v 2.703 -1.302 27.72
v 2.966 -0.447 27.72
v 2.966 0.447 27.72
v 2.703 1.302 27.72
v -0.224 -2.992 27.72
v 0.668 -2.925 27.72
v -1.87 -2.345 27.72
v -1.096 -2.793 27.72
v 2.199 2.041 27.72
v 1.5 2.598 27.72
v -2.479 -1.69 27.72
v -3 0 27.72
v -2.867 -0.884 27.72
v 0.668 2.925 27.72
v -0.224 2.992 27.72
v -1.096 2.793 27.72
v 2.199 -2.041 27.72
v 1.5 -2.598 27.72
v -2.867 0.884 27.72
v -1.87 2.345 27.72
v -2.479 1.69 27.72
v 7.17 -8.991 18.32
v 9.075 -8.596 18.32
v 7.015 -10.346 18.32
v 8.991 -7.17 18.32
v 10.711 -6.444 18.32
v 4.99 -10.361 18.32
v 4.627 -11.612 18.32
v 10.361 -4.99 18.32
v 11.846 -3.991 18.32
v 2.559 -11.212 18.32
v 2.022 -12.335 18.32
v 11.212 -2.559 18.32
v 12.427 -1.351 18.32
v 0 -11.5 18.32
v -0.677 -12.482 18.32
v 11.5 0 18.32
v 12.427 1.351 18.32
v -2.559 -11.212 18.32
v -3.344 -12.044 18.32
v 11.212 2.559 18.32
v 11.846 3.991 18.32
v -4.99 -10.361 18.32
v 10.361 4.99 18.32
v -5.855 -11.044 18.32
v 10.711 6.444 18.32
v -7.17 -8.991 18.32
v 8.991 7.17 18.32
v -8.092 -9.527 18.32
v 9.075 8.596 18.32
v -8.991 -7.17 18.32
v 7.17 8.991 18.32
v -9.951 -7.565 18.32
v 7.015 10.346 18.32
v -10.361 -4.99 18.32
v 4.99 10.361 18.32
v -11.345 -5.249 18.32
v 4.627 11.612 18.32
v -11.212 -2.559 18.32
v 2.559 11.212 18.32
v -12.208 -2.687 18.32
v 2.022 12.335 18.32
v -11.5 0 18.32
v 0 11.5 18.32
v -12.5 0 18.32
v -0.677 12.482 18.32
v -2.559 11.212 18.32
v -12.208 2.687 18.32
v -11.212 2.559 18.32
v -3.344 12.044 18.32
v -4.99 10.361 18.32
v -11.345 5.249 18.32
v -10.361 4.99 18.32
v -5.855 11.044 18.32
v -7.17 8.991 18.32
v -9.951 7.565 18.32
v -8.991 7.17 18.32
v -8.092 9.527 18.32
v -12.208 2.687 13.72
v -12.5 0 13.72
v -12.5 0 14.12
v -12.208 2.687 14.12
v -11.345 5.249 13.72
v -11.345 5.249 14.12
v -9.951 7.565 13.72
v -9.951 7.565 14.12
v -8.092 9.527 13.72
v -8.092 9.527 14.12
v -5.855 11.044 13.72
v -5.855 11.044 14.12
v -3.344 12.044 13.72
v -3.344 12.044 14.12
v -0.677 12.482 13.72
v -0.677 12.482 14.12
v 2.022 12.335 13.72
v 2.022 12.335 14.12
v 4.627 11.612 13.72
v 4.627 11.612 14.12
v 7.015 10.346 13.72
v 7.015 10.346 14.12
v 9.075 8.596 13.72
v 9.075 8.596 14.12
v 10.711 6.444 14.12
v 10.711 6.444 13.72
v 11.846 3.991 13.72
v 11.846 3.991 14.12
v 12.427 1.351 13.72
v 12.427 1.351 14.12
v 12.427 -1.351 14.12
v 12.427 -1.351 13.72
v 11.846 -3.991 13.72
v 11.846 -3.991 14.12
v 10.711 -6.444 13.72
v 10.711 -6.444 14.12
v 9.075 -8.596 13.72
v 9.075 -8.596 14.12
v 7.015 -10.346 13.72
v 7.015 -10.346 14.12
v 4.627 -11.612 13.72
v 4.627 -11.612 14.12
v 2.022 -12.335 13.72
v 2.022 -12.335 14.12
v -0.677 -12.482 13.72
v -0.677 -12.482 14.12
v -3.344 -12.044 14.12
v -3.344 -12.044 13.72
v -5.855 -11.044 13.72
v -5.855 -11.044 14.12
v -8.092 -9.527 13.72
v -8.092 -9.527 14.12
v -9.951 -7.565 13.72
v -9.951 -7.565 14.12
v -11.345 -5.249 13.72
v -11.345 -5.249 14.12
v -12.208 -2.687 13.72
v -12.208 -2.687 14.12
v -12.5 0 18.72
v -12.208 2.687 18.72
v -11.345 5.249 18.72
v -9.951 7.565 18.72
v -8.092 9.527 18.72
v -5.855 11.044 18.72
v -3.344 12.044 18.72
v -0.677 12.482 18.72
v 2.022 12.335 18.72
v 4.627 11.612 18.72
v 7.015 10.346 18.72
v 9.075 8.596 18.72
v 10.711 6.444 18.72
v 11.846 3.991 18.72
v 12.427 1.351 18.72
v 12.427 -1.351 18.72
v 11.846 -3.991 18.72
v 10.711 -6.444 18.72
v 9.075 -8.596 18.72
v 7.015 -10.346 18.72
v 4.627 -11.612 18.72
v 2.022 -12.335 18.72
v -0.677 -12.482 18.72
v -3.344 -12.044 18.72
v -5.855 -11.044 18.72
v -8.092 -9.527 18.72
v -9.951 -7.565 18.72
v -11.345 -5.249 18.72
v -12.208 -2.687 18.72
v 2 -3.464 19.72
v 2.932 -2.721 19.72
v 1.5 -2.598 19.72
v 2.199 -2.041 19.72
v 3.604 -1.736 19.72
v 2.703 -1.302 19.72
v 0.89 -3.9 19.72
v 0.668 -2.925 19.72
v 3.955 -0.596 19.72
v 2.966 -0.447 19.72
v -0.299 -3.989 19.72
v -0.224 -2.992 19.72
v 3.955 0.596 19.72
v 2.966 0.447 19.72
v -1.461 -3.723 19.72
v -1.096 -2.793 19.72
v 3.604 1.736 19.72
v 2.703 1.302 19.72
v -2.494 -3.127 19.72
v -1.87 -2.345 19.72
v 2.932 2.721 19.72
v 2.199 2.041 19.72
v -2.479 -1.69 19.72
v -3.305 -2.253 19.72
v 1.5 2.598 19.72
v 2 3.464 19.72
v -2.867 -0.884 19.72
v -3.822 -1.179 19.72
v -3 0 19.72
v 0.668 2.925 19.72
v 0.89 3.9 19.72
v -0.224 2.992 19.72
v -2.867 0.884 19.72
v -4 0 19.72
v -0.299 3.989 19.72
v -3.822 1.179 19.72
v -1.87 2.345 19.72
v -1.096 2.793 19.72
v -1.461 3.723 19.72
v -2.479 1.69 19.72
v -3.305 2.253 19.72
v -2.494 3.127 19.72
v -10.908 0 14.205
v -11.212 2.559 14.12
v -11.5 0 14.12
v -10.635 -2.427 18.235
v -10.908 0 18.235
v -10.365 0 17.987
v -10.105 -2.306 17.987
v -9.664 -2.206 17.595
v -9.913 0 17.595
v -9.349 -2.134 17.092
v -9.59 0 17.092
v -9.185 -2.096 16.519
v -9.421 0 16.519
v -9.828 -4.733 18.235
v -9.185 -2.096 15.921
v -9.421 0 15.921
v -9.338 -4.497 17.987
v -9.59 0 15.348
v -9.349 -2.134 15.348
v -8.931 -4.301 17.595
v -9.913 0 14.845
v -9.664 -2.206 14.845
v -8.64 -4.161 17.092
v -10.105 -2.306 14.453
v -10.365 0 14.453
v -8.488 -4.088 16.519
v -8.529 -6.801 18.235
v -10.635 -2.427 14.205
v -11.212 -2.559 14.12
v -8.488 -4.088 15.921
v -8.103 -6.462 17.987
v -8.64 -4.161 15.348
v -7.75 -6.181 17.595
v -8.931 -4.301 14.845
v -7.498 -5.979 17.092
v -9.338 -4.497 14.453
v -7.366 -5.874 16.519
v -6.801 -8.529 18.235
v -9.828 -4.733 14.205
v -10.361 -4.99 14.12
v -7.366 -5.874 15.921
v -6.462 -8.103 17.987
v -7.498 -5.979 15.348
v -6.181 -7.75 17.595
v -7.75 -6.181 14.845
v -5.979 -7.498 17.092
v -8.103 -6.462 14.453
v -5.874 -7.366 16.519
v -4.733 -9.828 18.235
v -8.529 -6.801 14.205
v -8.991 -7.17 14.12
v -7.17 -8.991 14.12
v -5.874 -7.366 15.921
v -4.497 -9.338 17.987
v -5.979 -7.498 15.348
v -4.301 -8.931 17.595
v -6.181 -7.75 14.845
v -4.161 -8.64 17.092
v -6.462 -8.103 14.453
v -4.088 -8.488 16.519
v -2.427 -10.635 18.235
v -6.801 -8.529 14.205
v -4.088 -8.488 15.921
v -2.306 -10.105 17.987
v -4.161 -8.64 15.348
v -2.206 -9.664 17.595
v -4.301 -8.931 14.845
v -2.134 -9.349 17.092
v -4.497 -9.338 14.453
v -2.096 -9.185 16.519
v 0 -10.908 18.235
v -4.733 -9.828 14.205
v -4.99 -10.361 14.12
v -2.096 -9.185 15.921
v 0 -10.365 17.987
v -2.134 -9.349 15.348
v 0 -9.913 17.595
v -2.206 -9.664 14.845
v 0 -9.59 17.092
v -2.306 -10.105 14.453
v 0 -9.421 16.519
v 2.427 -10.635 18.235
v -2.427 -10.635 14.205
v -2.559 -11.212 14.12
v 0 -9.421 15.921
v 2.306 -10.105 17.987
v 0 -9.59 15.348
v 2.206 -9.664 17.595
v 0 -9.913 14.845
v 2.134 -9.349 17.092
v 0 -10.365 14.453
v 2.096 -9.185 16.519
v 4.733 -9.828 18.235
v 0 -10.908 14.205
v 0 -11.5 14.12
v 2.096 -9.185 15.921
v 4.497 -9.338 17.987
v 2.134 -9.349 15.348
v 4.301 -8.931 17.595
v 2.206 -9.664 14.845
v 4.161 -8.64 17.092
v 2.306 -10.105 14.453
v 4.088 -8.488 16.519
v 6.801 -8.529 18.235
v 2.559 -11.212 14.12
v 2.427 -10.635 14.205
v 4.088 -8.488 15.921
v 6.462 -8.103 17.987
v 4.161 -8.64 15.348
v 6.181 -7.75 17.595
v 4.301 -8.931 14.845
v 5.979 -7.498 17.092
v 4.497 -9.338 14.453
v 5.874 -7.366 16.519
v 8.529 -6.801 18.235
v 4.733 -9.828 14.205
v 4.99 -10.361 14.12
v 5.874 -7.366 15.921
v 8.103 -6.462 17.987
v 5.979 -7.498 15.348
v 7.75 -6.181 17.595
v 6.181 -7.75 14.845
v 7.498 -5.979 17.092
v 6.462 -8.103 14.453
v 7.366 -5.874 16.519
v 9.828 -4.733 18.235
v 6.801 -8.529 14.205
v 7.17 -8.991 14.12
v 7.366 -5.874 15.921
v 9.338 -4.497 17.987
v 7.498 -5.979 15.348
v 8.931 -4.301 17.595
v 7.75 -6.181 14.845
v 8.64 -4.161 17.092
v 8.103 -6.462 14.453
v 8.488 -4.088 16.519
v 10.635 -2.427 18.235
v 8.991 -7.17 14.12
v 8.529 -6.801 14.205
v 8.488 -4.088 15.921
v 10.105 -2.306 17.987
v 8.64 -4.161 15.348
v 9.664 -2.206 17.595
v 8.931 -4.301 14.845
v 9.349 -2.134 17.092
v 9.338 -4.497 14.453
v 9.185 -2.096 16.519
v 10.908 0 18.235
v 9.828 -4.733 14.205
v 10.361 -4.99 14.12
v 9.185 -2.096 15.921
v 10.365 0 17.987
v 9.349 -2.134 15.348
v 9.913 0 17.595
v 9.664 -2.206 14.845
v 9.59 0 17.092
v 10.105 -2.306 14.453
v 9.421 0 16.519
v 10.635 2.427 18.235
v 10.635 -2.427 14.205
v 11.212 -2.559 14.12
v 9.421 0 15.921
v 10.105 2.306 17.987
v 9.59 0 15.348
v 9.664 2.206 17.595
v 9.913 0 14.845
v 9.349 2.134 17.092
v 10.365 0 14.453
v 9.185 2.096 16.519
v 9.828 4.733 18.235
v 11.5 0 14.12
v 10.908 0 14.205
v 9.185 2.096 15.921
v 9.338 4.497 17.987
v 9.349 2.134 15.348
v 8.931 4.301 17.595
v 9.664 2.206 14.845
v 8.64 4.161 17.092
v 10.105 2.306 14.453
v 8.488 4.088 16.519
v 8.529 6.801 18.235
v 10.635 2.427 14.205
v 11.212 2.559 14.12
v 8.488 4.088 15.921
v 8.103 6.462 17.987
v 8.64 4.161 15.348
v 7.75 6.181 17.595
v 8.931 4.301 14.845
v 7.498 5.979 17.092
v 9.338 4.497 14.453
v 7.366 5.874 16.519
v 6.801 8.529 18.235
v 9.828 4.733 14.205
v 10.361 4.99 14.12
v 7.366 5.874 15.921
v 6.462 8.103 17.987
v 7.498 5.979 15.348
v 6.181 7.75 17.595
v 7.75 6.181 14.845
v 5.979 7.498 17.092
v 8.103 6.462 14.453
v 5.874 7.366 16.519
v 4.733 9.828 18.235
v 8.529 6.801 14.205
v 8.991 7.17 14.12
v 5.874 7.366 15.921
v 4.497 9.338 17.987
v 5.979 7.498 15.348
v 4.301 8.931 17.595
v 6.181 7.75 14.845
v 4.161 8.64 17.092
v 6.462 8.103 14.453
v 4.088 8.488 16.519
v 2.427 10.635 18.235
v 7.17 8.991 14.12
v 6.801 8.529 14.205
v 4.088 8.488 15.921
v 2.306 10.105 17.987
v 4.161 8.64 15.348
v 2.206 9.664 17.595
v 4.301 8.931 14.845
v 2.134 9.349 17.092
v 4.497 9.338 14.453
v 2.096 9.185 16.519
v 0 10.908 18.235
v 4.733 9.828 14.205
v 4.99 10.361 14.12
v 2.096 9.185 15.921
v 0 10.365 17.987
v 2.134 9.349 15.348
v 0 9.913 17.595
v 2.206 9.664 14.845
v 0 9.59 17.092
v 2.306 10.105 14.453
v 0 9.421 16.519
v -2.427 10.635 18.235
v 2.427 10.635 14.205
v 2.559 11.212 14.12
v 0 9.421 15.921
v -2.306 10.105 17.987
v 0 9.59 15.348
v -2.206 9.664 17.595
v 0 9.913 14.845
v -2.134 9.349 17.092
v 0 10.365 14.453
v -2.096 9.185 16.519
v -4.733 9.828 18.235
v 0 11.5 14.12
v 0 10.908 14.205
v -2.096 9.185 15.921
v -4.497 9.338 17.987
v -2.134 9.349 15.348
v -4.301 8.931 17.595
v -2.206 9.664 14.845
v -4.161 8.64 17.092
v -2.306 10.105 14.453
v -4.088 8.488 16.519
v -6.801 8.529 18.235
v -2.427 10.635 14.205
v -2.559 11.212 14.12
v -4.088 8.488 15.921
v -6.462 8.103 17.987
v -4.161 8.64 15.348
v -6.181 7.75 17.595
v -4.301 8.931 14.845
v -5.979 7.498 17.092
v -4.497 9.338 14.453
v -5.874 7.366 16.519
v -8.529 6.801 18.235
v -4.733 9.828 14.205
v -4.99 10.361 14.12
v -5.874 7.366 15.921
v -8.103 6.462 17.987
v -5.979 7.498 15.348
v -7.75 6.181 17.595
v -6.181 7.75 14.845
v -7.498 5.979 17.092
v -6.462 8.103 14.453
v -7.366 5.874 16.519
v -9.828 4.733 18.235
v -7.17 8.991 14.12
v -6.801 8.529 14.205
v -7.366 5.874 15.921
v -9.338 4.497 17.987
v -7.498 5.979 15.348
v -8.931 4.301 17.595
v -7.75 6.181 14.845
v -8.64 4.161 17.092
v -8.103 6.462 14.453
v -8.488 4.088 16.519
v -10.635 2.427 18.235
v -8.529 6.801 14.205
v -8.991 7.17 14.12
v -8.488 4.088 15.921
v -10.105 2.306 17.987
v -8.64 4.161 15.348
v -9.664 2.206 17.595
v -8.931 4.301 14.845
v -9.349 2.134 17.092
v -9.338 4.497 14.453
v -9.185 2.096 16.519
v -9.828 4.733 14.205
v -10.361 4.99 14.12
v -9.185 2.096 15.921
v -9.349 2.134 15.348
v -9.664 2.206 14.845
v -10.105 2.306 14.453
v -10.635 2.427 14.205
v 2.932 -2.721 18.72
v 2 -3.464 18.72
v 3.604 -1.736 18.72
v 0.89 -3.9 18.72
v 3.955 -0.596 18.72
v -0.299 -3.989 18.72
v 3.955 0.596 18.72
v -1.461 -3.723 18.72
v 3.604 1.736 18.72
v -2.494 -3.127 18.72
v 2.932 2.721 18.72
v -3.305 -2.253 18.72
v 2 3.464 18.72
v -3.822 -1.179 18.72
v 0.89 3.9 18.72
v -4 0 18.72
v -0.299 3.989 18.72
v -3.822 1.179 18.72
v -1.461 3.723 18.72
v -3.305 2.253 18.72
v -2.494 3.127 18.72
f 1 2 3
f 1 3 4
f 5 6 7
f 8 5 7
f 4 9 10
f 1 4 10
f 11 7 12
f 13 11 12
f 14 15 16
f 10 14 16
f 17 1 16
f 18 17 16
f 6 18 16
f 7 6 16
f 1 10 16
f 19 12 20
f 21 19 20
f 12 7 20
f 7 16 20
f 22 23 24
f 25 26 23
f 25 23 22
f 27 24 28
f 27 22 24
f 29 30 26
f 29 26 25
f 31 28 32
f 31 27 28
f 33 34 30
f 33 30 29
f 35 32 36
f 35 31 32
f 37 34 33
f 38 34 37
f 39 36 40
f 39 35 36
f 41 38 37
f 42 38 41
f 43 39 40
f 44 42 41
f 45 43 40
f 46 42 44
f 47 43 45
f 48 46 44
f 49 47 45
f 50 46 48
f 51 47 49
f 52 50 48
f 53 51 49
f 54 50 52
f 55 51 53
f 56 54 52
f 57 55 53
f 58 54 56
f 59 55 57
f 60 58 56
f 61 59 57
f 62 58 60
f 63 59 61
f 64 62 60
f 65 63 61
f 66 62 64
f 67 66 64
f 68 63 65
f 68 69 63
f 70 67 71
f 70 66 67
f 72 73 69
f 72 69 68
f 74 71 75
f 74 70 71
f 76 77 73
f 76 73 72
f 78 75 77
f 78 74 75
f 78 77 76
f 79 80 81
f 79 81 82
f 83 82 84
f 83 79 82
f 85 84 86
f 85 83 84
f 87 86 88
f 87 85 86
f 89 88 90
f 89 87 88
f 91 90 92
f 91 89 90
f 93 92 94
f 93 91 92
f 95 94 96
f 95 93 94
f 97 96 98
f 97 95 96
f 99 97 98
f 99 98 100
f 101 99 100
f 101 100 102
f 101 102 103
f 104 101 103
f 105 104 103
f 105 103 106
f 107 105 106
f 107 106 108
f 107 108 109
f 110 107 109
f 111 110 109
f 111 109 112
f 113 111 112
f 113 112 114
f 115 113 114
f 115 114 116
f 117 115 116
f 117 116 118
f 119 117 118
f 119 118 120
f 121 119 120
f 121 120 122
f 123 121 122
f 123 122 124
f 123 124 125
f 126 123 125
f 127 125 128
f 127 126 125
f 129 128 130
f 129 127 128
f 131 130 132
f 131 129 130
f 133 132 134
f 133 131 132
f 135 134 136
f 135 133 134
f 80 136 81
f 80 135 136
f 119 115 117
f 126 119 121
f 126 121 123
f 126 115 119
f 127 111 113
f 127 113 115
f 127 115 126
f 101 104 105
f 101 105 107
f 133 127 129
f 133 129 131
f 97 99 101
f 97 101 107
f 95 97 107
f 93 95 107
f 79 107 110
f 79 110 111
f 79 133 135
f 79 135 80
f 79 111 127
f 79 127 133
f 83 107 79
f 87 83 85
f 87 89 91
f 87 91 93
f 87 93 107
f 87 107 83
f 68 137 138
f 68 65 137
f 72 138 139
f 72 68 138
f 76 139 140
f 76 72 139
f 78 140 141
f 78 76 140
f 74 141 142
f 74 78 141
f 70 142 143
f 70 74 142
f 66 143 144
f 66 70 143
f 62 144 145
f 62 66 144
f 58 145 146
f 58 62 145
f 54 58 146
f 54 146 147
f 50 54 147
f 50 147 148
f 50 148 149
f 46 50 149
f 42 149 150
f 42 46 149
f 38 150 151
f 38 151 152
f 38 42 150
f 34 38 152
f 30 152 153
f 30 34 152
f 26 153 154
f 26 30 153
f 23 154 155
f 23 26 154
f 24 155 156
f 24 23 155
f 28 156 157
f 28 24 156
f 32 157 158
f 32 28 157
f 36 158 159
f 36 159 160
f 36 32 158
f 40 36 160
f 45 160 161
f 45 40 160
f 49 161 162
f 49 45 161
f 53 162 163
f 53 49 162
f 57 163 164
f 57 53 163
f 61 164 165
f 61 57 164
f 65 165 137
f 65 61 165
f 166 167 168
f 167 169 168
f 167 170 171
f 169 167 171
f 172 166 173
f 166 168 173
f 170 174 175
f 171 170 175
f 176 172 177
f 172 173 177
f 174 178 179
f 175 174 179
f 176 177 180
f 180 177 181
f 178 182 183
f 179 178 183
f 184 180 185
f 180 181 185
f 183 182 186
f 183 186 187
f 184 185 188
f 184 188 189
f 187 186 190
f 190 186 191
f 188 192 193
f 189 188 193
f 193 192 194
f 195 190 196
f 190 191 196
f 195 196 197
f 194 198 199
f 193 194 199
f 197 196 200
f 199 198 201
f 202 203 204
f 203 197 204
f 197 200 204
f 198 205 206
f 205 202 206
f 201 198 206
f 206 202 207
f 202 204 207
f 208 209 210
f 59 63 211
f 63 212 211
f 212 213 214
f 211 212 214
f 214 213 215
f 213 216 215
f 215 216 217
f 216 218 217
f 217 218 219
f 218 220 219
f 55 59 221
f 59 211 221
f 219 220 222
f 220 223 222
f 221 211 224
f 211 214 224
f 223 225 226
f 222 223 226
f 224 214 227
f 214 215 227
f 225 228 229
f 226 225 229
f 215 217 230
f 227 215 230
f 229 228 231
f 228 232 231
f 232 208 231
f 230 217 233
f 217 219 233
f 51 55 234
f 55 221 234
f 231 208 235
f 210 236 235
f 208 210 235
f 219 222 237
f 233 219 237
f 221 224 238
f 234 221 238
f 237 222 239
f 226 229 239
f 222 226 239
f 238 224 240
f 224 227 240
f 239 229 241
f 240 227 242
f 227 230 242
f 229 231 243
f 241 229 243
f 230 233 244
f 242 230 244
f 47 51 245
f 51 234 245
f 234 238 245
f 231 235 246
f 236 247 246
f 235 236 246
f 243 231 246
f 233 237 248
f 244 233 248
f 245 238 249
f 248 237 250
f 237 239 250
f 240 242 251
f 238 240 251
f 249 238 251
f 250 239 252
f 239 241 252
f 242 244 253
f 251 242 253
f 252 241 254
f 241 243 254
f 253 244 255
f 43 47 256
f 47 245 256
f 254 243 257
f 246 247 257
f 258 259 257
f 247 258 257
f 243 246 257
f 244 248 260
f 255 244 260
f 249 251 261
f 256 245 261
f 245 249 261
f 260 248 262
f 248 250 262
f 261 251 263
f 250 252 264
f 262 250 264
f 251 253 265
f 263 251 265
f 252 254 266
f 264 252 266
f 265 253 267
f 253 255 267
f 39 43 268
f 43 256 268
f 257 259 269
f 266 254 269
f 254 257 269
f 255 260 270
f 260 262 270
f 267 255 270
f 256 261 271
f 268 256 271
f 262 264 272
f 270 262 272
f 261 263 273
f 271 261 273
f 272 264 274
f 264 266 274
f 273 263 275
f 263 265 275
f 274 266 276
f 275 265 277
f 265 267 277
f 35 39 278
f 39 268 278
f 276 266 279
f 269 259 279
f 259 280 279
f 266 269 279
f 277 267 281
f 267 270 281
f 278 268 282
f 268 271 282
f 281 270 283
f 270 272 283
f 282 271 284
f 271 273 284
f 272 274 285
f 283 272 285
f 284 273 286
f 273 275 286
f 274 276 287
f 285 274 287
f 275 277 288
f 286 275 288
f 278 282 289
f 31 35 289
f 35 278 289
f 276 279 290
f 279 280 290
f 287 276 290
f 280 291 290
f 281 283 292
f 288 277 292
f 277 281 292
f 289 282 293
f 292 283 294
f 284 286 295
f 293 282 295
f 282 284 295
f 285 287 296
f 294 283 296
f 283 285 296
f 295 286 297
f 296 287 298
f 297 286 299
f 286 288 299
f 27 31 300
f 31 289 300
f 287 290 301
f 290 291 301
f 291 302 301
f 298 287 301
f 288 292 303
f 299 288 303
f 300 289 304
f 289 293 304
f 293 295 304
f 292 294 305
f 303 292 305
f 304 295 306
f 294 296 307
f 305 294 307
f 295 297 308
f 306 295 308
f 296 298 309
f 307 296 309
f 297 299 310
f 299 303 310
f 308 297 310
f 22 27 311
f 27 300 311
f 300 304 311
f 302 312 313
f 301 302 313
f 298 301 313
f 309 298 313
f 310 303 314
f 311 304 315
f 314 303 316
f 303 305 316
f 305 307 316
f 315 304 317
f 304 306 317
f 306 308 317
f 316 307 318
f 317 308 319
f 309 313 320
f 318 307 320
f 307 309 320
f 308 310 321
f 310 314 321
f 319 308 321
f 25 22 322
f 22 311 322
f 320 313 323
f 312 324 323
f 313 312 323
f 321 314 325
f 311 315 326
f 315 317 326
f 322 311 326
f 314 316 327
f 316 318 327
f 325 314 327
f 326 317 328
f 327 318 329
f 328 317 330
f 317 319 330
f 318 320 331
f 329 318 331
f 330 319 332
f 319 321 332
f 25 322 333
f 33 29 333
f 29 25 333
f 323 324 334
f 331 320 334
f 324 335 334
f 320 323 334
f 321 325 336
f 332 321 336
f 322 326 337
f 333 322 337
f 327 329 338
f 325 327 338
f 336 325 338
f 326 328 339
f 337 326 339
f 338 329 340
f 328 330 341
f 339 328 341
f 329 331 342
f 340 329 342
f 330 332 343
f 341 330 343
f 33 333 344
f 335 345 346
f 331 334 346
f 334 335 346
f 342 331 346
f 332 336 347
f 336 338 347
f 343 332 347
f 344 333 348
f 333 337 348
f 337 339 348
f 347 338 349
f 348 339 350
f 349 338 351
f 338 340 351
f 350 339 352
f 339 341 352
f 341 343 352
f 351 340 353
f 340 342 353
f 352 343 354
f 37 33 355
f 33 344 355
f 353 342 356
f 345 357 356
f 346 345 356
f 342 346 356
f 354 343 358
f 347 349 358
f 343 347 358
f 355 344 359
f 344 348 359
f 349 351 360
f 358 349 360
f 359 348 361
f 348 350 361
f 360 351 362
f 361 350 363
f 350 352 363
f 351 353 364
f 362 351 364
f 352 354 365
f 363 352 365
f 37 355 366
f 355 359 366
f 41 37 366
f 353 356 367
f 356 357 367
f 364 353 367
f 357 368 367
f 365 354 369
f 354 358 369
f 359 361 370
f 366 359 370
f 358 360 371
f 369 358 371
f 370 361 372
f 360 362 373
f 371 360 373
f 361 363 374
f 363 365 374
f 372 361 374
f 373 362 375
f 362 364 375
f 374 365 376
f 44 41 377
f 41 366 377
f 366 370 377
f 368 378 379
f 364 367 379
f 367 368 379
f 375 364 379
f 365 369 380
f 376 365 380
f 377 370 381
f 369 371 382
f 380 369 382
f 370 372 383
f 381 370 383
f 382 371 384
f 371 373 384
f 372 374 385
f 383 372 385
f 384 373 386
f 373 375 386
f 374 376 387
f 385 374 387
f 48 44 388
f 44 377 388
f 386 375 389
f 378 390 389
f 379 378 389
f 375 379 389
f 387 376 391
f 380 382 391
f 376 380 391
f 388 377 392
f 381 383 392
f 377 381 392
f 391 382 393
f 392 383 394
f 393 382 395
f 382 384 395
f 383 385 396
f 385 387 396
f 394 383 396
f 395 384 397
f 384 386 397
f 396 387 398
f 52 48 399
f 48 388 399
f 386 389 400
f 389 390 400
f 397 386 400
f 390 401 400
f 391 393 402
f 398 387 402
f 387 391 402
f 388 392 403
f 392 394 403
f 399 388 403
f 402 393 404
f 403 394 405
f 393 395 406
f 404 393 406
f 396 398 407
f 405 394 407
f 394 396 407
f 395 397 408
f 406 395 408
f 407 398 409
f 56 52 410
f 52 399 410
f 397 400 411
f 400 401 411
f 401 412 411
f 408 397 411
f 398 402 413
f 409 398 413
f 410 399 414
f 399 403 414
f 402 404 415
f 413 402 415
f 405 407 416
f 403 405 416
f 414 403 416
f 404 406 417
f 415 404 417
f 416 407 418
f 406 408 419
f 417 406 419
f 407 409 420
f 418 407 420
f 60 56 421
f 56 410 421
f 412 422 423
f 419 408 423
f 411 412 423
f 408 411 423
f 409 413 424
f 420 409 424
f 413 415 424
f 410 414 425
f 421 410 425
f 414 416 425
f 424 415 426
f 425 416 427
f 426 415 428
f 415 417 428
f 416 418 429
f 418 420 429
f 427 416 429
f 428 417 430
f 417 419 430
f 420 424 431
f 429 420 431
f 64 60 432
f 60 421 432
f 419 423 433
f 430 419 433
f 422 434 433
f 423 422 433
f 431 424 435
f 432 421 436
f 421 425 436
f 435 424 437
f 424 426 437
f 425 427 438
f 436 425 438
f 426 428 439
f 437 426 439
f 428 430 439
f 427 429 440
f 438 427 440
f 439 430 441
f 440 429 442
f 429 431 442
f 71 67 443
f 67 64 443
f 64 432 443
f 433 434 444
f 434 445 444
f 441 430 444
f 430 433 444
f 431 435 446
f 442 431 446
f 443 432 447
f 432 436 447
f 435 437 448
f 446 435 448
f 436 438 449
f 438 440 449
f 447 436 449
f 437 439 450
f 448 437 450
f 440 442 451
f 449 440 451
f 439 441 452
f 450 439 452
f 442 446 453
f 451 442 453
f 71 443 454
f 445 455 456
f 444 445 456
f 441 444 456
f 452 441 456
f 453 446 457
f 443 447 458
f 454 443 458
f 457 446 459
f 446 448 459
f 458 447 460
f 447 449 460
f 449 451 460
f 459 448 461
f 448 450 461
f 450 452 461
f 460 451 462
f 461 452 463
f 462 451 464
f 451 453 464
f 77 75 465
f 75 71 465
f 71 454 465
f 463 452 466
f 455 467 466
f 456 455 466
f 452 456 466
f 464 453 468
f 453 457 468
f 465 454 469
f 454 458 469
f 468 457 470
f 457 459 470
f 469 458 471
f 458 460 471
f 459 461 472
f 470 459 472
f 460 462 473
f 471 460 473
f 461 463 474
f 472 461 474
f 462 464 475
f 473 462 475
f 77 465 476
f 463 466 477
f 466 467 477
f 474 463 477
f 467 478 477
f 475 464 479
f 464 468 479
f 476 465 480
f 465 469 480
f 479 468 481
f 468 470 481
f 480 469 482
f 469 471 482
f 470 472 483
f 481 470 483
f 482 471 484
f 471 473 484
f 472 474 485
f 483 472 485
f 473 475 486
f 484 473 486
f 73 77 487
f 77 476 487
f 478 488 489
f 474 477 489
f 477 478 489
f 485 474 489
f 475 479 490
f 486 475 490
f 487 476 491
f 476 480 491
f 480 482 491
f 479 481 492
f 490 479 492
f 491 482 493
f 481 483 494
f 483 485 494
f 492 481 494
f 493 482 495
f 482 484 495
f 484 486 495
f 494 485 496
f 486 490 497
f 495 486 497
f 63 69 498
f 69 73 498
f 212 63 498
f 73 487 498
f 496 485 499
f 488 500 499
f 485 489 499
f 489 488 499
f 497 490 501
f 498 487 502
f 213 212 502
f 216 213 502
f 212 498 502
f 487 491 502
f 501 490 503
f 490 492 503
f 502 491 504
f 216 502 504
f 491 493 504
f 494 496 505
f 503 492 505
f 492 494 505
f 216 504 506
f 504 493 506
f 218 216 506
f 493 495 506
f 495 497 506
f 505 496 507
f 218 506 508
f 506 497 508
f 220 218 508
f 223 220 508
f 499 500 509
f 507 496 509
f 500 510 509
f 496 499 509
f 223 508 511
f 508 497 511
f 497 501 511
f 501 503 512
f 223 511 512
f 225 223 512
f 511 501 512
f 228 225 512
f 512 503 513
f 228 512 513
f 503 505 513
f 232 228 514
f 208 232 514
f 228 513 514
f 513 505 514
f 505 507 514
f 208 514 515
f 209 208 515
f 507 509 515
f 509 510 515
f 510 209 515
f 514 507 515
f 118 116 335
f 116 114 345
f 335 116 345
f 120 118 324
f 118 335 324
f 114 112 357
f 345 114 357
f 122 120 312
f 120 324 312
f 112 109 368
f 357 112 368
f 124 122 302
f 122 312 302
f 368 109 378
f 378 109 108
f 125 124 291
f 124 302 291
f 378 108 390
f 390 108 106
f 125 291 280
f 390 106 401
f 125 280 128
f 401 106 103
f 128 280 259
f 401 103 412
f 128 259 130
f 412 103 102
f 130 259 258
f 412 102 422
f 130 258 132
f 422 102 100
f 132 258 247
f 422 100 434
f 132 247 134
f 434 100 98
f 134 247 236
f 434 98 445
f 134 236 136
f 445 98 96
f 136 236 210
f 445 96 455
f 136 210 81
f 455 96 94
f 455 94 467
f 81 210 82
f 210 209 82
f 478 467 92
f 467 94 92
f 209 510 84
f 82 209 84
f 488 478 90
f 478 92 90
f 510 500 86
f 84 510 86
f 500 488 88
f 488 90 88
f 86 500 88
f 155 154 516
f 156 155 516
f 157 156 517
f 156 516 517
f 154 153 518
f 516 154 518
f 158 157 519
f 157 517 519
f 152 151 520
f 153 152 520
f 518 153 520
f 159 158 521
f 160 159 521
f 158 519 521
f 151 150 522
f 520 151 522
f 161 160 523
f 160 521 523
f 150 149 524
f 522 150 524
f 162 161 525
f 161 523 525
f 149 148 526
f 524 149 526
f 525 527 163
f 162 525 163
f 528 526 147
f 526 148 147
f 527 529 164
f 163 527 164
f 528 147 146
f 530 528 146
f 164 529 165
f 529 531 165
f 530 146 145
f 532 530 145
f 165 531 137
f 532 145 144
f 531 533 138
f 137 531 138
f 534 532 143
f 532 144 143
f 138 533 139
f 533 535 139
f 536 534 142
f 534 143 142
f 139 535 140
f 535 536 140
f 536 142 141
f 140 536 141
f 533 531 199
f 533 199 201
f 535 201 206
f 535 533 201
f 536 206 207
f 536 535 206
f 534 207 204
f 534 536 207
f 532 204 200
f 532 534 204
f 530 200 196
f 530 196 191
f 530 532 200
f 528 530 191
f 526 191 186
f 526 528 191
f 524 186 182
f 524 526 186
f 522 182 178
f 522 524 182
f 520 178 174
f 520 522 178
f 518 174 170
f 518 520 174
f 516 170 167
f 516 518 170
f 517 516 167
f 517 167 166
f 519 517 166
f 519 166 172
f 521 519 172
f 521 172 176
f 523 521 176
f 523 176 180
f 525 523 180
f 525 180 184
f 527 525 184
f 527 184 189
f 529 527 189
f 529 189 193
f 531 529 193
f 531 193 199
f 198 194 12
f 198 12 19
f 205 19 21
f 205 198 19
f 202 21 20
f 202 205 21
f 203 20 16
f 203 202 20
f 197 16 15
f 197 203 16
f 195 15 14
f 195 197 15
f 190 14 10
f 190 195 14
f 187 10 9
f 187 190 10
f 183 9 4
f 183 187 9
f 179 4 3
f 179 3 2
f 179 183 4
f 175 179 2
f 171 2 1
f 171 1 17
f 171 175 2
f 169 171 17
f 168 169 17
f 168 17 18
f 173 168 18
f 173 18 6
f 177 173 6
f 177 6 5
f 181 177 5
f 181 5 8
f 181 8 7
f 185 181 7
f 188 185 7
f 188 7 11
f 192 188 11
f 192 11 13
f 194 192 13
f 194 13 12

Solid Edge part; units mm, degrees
sketch "Sketch1" plane through (0, 0, 0) normal (0, -1, 0) x (1, 0, 0)
  line L0 (0, 18.72) -> (0, 13.72)
  line L1 (0, 13.72) -> (-11.5, 13.72)
  line L2 (-12.5, 13.72) -> (-11.5, 13.72)
  line L3 (-12.5, 14.12) -> (-12.5, 13.72)
  line L4 (-11.5, 14.12) -> (-12.5, 14.12)
  arc A0 (-11.5, 18.32) -> (-11.5, 14.12) centre (-11.5, 16.22) cw
  line L5 (-12.5, 18.32) -> (-11.5, 18.32)
  line L6 (-12.5, 18.72) -> (-12.5, 18.32)
  line L7 (-11.5, 18.72) -> (-12.5, 18.72)
  line L8 (-11.5, 18.72) -> (0, 18.72)
  dimension "D1" = 11.5
  dimension "D2" = 2.1
  dimension "D3" = 1
  dimension "D4" = 0.4
revolve "RevolvedProtrusion1" add sketch "Sketch1" angle 360 about axis through (0, 0, 54) along (0, 0, -1)
sketch "Sketch2" plane through (0, 0, 0) normal (0, -1, 0) x (1, 0, 0)
  line L0 (0, 18.72) -> (0, 27.72)
  line L1 (0, 27.72) -> (-3, 27.72)
  line L2 (-3, 27.72) -> (-3, 19.72)
  line L3 (-3, 19.72) -> (-4, 19.72)
  line L4 (-4, 19.72) -> (-4, 18.72)
  line L5 (-4, 18.72) -> (0, 18.72)
  dimension "D1" = 3
  dimension "D2" = 8
  dimension "D3" = 1
  dimension "D4" = 1
revolve "RevolvedProtrusion2" add sketch "Sketch2" angle 360 about axis through (0, 0, 54) along (0, 0, -1)
